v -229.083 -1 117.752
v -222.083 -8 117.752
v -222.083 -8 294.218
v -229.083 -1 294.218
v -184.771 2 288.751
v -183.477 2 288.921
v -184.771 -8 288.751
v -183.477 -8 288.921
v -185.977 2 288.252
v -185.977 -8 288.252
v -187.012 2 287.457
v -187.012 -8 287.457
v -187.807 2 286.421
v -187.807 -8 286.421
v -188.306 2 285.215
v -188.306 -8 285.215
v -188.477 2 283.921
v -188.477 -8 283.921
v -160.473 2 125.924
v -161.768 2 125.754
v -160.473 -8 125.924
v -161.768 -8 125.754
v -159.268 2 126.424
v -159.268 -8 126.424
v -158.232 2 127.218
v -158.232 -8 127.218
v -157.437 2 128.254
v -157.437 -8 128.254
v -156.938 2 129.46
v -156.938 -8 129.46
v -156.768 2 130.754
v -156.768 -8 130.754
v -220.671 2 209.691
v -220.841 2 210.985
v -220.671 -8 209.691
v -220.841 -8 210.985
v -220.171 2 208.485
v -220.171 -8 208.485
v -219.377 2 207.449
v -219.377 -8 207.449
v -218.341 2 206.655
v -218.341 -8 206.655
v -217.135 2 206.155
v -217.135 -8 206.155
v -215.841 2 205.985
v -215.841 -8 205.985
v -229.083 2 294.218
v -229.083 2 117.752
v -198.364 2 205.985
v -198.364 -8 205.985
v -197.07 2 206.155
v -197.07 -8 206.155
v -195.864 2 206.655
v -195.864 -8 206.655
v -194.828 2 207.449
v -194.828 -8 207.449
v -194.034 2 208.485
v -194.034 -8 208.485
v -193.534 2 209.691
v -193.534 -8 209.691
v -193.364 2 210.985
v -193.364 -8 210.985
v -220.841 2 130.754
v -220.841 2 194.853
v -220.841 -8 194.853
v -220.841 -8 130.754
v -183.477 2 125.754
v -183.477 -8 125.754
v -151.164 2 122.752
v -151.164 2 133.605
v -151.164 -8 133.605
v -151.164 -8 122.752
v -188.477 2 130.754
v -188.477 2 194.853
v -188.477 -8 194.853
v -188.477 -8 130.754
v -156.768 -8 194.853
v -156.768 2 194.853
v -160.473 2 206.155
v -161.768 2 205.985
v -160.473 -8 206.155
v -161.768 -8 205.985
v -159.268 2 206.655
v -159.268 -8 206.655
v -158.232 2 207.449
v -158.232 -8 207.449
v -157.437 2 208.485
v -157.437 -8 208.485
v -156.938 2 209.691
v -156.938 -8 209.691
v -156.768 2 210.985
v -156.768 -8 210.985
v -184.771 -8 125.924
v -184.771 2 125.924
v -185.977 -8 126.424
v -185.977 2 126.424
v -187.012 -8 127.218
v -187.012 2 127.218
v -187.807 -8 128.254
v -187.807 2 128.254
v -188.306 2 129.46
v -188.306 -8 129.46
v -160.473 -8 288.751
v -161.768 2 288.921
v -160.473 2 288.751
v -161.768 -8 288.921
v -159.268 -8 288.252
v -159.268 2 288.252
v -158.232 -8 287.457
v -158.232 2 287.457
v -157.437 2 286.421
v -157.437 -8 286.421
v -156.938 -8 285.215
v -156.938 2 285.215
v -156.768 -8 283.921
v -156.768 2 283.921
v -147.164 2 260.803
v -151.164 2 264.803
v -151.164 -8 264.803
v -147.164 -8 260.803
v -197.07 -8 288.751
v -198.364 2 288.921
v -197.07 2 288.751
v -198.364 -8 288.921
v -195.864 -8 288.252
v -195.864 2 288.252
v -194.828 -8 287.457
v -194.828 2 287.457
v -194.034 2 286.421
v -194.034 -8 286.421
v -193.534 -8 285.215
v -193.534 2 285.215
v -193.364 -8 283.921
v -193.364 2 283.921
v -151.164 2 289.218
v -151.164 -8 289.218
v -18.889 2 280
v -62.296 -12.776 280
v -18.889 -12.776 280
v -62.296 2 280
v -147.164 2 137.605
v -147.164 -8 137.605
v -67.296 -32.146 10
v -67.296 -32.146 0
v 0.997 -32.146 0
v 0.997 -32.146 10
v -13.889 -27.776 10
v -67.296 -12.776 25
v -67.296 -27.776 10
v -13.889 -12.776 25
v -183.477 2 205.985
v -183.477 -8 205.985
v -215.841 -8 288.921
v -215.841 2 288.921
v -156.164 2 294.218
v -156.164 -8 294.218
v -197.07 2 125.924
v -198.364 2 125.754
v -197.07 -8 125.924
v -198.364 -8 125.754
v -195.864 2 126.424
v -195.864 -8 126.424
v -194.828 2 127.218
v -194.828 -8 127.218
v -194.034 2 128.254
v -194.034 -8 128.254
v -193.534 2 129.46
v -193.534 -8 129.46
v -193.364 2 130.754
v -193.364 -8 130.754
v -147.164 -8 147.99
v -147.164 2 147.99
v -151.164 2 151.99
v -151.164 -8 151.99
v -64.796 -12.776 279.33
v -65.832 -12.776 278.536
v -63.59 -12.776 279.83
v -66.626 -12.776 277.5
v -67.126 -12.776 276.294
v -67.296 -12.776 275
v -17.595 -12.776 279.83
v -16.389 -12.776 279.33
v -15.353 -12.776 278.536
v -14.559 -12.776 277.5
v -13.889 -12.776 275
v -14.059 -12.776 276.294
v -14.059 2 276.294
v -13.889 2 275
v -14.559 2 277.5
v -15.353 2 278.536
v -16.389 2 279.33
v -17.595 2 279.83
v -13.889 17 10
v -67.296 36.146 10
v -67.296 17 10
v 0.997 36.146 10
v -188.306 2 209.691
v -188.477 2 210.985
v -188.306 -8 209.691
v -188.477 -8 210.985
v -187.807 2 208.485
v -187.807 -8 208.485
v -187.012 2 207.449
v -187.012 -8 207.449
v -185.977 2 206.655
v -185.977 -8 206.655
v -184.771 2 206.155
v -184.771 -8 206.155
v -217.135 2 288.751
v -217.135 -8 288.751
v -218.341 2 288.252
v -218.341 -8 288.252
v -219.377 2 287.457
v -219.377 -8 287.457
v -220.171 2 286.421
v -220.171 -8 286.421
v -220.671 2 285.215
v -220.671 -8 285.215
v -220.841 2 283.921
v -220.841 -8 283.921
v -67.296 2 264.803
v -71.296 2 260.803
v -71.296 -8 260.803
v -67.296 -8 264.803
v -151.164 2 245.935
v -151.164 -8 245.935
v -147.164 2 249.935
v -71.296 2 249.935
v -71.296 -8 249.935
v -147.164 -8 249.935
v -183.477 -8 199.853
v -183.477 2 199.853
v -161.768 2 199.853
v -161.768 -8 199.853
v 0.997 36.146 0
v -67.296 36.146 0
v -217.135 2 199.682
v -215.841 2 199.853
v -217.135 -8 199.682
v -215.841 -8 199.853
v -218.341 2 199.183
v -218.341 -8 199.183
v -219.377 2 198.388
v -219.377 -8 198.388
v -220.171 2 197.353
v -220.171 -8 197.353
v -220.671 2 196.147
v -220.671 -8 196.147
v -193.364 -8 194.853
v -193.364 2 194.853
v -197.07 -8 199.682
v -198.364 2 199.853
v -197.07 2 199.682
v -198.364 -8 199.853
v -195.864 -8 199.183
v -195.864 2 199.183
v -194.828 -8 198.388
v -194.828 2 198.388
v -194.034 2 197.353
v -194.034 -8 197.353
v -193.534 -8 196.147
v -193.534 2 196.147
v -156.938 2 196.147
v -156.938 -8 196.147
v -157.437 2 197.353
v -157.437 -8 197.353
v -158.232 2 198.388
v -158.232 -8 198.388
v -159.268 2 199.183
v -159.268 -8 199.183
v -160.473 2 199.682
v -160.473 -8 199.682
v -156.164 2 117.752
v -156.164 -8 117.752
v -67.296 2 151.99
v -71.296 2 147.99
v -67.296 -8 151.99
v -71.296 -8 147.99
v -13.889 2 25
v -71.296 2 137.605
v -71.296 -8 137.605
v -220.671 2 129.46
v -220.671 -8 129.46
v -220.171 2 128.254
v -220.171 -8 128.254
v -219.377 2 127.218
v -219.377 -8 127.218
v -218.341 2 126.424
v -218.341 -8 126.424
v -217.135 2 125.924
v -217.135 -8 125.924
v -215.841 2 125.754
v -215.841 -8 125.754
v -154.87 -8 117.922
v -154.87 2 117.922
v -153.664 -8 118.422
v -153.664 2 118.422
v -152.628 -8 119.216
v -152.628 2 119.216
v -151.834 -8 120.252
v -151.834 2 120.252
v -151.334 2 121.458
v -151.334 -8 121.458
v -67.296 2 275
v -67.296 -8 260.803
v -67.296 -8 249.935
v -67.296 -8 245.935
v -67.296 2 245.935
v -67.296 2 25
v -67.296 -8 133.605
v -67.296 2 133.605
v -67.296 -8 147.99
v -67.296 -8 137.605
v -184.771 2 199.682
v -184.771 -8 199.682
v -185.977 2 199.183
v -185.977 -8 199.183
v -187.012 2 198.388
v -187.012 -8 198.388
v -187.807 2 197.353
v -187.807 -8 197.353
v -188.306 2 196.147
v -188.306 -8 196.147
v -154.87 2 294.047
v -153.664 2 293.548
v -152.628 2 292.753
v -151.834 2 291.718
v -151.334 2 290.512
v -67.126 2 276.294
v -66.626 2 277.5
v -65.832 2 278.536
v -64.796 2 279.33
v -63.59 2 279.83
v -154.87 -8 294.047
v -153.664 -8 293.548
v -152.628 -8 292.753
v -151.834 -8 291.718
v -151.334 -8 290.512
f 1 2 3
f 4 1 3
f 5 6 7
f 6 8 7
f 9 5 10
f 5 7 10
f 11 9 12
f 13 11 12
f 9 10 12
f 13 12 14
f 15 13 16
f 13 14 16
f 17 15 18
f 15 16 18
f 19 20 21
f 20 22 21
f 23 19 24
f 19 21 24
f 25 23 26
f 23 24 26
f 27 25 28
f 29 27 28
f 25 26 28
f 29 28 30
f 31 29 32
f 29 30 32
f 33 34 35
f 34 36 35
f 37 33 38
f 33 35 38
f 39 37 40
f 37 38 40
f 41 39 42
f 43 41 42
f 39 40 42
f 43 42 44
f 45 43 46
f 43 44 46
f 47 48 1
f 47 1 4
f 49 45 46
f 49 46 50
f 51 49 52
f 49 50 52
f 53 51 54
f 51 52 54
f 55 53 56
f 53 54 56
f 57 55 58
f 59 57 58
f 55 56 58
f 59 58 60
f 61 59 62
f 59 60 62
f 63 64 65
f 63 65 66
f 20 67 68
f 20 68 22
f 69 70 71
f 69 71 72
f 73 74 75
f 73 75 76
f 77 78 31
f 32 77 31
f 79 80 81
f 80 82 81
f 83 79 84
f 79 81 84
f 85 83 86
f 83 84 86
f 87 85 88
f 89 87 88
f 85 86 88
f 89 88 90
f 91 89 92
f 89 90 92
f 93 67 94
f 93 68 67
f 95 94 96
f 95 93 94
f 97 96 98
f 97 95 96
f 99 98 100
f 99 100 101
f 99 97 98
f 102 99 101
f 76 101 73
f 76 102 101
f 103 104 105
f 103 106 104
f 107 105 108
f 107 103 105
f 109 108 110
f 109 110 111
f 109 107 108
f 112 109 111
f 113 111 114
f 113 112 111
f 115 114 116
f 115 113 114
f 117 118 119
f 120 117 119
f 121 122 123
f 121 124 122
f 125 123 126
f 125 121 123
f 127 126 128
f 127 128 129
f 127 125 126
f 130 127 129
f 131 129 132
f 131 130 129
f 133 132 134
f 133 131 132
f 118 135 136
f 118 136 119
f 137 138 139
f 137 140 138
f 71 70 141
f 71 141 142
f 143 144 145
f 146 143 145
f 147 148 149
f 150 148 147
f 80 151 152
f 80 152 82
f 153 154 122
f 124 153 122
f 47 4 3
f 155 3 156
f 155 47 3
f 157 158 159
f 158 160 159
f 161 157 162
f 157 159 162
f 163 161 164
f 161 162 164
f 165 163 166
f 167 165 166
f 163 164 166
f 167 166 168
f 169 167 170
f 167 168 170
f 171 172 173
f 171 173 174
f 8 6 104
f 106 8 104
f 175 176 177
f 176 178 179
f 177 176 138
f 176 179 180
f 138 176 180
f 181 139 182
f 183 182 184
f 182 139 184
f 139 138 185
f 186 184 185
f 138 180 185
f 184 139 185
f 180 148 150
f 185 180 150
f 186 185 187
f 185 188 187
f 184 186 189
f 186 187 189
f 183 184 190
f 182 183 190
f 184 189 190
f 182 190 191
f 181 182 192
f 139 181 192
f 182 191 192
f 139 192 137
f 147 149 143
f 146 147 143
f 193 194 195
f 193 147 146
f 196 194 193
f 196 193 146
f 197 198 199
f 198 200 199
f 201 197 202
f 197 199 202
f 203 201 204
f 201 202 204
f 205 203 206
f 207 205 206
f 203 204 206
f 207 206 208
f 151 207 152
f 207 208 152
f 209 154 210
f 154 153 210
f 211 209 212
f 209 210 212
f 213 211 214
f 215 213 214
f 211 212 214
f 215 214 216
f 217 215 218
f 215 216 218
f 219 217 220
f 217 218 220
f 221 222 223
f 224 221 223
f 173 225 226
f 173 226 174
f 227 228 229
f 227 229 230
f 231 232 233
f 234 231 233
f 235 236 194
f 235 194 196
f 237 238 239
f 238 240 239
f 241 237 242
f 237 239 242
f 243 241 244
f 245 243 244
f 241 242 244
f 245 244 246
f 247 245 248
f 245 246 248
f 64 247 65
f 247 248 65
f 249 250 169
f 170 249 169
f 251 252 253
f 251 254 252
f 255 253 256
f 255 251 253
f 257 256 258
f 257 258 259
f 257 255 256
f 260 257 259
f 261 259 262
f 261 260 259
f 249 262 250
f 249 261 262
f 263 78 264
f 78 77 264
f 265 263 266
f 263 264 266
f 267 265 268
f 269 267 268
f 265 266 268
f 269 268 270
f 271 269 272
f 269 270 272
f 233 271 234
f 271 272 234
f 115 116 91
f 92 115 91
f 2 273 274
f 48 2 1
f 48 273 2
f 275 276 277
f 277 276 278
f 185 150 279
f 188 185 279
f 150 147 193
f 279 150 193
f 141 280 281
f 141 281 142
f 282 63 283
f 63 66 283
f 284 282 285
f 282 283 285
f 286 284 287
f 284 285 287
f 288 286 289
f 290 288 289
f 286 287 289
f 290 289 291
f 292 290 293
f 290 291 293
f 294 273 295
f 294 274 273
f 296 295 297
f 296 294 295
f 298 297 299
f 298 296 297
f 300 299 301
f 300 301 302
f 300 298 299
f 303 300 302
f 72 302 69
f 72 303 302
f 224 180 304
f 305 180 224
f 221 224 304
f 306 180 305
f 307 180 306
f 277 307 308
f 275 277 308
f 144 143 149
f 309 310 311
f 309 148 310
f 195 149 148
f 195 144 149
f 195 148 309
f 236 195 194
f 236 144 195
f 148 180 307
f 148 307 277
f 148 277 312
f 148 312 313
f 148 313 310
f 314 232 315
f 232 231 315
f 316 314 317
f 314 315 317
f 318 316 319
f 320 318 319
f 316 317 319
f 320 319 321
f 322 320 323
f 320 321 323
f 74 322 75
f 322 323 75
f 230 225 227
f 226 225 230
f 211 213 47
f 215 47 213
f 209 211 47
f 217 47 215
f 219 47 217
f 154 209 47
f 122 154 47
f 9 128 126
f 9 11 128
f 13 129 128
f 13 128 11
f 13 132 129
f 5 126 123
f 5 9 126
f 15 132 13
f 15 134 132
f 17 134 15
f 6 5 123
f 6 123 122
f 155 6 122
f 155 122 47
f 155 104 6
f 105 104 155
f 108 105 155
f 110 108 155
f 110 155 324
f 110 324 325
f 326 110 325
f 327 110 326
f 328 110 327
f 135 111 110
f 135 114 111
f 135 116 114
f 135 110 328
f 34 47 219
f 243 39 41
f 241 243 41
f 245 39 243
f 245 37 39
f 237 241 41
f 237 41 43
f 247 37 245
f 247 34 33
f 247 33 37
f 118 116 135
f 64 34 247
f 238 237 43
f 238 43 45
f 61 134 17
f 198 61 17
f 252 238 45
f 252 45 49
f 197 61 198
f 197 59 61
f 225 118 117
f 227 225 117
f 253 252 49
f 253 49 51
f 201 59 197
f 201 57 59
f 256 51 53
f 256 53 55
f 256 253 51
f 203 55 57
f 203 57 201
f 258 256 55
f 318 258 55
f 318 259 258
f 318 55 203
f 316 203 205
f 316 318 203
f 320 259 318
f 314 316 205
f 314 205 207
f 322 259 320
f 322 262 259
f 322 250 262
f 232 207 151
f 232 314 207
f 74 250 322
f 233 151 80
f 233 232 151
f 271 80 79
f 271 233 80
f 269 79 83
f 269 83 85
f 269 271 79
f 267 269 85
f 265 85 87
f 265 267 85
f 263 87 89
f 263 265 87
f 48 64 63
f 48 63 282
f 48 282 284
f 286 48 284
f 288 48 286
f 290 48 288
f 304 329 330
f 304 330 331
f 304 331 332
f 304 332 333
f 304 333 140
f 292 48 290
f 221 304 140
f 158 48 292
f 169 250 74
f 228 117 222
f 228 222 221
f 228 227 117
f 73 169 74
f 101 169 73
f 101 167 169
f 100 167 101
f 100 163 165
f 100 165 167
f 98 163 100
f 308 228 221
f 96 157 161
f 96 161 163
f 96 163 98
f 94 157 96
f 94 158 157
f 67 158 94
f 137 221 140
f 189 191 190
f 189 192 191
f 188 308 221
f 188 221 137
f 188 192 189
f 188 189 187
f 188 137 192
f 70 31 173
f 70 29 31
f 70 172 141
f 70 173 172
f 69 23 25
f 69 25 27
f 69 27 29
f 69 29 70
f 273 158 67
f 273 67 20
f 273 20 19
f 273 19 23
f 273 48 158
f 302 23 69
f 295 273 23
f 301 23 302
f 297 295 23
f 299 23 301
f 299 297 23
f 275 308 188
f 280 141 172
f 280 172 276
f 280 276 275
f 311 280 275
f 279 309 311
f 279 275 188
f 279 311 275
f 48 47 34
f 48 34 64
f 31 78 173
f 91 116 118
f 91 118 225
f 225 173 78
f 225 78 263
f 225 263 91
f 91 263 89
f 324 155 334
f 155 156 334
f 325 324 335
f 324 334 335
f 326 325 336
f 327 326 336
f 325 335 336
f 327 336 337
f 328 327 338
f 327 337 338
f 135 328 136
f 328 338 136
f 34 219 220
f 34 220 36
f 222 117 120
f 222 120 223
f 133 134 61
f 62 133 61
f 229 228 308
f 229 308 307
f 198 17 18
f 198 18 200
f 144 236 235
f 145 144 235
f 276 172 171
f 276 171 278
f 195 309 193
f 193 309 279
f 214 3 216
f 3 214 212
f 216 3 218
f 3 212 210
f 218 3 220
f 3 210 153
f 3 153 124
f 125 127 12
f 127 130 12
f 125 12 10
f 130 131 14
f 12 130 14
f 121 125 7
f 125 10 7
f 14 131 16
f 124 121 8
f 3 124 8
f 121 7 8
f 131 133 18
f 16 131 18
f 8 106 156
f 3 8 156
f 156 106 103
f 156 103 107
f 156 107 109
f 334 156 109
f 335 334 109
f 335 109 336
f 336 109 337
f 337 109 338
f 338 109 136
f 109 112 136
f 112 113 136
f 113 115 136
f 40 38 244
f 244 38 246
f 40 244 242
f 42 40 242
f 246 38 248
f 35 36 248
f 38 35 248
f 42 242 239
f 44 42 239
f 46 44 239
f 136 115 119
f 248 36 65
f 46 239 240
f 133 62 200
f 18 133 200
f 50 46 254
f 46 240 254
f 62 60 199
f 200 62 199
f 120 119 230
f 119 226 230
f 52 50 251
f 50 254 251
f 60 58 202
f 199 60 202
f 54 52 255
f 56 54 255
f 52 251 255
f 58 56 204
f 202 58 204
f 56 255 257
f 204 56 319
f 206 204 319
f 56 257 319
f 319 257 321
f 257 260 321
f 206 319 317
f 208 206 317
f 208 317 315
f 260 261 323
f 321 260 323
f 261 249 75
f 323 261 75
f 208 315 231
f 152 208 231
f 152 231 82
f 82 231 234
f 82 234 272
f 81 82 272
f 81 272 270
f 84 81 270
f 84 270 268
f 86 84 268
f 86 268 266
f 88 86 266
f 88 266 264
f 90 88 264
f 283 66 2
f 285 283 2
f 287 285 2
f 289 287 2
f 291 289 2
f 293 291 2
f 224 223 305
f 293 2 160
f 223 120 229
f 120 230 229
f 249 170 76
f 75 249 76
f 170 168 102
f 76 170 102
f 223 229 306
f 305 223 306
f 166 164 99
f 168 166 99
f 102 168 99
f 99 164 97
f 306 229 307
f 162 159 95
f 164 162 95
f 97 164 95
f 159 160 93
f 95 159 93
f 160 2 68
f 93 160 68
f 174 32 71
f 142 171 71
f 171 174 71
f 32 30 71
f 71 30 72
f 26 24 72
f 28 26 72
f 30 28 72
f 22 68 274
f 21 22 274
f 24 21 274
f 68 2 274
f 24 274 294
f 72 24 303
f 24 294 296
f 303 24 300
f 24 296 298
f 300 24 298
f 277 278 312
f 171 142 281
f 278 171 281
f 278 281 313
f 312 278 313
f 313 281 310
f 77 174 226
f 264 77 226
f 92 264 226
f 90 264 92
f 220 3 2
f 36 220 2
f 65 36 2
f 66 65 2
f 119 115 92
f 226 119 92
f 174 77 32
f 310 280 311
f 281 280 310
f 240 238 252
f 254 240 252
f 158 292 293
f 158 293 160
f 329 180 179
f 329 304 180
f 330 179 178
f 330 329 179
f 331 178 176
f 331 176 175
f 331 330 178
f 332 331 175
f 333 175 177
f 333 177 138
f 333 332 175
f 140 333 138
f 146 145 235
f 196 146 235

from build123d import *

# Parameters (mm, degrees)
SKETCH_1_W      = 68.292893219
SKETCH_1_H      = 68.292893218
EXTRUDE_1_DEPTH = 10
SKETCH_2_W      = 53.40749746
SKETCH_2_H      = 14.776374923
EXTRUDE_2_DEPTH = 270
SKETCH_4_W      = 27.47748939
SKETCH_4_H      = 82.93676663
SKETCH_4_H_2    = 74.09911356
SKETCH_4_W_2    = 31.70911111
EXTRUDE_3_DEPTH = 10
CHAMFER_1_SIZE  = 15
CHAMFER_3_SIZE  = 7
FILLET_3_R      = 5
CHAMFER_4_SIZE  = 4


with BuildPart() as part:
    # 草图1 → 凸台-拉伸1 (new body)
    with BuildSketch(Plane.XY):
        with Locations((-33.149855831, 2)):
            Rectangle(SKETCH_1_W, SKETCH_1_H)
    extrude(amount=EXTRUDE_1_DEPTH)

    # 草图2 → 凸台-拉伸2 (add)
    with BuildSketch(Plane.XY.offset(10)):
        with Locations((-40.59255371, -5.388187462)):
            Rectangle(SKETCH_2_W, SKETCH_2_H)
    extrude(amount=EXTRUDE_2_DEPTH)

    # 草图4 → 凸台-拉伸3 (add)
    with BuildSketch(Plane(origin=(0, 2, 0), x_dir=(1, 0, 0), z_dir=(0, 1, 0))):
        Polygon((-151.163737931, -260.803324395), (-67.29630244, -260.803324395), (-67.29630244, -249.935229756), (-151.163737931, -249.935229756), (-151.163737931, -147.989777894), (-67.29630244, -147.989777894), (-67.29630244, -137.604662475), (-151.163737931, -137.604662475), (-151.163737931, -117.751683705), (-229.082858204, -117.751683705), (-229.082858204, -294.217578605), (-151.163737931, -294.217578605), align=None)
        with Locations((-207.102608026, -247.45301447)):
            Rectangle(SKETCH_4_W, SKETCH_4_H, mode=Mode.SUBTRACT)
        with Locations((-207.102608026, -162.803209554)):
            Rectangle(SKETCH_4_W, SKETCH_4_H_2, mode=Mode.SUBTRACT)
        with Locations((-172.622136648, -247.45301447)):
            Rectangle(SKETCH_4_W_2, SKETCH_4_H, mode=Mode.SUBTRACT)
        with Locations((-172.622136648, -162.803209554)):
            Rectangle(SKETCH_4_W_2, SKETCH_4_H_2, mode=Mode.SUBTRACT)
    extrude(amount=-EXTRUDE_3_DEPTH)

    # 倒角1
    chamfer_1_edges = [part.edges().sort_by_distance(p)[0] for p in [
        (-40.59255371, 2, 10),
        (-40.59255371, -12.776374923, 10),
    ]]
    chamfer(chamfer_1_edges, length=CHAMFER_1_SIZE)

    # 倒角3
    chamfer_3_edges = [part.edges().sort_by_distance(p)[0] for p in [
        (-229.082858204, -8, 205.984631155),
    ]]
    chamfer(chamfer_3_edges, length=CHAMFER_3_SIZE)

    # 圆角3
    fillet_3_edges = [part.edges().sort_by_distance(p)[0] for p in [
        (-13.88880498, -5.388187462, 280),
        (-67.29630244, -5.388187462, 280),
        (-220.841352721, -3, 125.753652774),
        (-220.841352721, -3, 205.984631155),
        (-193.363863331, -3, 288.921397785),
        (-220.841352721, -3, 288.921397785),
        (-156.767581093, -3, 288.921397785),
        (-156.767581093, -3, 199.852766334),
        (-188.476692203, -3, 125.753652774),
        (-156.767581093, -3, 125.753652774),
        (-193.363863331, -3, 125.753652774),
        (-151.163737931, -3, 294.217578605),
        (-151.163737931, -3, 117.751683705),
        (-193.363863331, -3, 199.852766334),
        (-156.767581093, -3, 205.984631155),
        (-193.363863331, -3, 205.984631155),
        (-220.841352721, -3, 199.852766334),
        (-188.476692203, -3, 199.852766334),
        (-188.476692203, -3, 205.984631155),
        (-188.476692203, -3, 288.921397785),
    ]]
    fillet(fillet_3_edges, radius=FILLET_3_R)

    # 倒角4
    chamfer_4_edges = [part.edges().sort_by_distance(p)[0] for p in [
        (-67.29630244, -3, 249.935229756),
        (-67.29630244, -3, 260.803324395),
        (-151.163737931, -3, 260.803324395),
        (-151.163737931, -3, 137.604662475),
        (-67.29630244, -3, 137.604662475),
        (-67.29630244, -3, 147.989777894),
        (-151.163737931, -3, 147.989777894),
        (-151.163737931, -3, 249.935229756),
    ]]
    chamfer(chamfer_4_edges, length=CHAMFER_4_SIZE)


solid = part.part
